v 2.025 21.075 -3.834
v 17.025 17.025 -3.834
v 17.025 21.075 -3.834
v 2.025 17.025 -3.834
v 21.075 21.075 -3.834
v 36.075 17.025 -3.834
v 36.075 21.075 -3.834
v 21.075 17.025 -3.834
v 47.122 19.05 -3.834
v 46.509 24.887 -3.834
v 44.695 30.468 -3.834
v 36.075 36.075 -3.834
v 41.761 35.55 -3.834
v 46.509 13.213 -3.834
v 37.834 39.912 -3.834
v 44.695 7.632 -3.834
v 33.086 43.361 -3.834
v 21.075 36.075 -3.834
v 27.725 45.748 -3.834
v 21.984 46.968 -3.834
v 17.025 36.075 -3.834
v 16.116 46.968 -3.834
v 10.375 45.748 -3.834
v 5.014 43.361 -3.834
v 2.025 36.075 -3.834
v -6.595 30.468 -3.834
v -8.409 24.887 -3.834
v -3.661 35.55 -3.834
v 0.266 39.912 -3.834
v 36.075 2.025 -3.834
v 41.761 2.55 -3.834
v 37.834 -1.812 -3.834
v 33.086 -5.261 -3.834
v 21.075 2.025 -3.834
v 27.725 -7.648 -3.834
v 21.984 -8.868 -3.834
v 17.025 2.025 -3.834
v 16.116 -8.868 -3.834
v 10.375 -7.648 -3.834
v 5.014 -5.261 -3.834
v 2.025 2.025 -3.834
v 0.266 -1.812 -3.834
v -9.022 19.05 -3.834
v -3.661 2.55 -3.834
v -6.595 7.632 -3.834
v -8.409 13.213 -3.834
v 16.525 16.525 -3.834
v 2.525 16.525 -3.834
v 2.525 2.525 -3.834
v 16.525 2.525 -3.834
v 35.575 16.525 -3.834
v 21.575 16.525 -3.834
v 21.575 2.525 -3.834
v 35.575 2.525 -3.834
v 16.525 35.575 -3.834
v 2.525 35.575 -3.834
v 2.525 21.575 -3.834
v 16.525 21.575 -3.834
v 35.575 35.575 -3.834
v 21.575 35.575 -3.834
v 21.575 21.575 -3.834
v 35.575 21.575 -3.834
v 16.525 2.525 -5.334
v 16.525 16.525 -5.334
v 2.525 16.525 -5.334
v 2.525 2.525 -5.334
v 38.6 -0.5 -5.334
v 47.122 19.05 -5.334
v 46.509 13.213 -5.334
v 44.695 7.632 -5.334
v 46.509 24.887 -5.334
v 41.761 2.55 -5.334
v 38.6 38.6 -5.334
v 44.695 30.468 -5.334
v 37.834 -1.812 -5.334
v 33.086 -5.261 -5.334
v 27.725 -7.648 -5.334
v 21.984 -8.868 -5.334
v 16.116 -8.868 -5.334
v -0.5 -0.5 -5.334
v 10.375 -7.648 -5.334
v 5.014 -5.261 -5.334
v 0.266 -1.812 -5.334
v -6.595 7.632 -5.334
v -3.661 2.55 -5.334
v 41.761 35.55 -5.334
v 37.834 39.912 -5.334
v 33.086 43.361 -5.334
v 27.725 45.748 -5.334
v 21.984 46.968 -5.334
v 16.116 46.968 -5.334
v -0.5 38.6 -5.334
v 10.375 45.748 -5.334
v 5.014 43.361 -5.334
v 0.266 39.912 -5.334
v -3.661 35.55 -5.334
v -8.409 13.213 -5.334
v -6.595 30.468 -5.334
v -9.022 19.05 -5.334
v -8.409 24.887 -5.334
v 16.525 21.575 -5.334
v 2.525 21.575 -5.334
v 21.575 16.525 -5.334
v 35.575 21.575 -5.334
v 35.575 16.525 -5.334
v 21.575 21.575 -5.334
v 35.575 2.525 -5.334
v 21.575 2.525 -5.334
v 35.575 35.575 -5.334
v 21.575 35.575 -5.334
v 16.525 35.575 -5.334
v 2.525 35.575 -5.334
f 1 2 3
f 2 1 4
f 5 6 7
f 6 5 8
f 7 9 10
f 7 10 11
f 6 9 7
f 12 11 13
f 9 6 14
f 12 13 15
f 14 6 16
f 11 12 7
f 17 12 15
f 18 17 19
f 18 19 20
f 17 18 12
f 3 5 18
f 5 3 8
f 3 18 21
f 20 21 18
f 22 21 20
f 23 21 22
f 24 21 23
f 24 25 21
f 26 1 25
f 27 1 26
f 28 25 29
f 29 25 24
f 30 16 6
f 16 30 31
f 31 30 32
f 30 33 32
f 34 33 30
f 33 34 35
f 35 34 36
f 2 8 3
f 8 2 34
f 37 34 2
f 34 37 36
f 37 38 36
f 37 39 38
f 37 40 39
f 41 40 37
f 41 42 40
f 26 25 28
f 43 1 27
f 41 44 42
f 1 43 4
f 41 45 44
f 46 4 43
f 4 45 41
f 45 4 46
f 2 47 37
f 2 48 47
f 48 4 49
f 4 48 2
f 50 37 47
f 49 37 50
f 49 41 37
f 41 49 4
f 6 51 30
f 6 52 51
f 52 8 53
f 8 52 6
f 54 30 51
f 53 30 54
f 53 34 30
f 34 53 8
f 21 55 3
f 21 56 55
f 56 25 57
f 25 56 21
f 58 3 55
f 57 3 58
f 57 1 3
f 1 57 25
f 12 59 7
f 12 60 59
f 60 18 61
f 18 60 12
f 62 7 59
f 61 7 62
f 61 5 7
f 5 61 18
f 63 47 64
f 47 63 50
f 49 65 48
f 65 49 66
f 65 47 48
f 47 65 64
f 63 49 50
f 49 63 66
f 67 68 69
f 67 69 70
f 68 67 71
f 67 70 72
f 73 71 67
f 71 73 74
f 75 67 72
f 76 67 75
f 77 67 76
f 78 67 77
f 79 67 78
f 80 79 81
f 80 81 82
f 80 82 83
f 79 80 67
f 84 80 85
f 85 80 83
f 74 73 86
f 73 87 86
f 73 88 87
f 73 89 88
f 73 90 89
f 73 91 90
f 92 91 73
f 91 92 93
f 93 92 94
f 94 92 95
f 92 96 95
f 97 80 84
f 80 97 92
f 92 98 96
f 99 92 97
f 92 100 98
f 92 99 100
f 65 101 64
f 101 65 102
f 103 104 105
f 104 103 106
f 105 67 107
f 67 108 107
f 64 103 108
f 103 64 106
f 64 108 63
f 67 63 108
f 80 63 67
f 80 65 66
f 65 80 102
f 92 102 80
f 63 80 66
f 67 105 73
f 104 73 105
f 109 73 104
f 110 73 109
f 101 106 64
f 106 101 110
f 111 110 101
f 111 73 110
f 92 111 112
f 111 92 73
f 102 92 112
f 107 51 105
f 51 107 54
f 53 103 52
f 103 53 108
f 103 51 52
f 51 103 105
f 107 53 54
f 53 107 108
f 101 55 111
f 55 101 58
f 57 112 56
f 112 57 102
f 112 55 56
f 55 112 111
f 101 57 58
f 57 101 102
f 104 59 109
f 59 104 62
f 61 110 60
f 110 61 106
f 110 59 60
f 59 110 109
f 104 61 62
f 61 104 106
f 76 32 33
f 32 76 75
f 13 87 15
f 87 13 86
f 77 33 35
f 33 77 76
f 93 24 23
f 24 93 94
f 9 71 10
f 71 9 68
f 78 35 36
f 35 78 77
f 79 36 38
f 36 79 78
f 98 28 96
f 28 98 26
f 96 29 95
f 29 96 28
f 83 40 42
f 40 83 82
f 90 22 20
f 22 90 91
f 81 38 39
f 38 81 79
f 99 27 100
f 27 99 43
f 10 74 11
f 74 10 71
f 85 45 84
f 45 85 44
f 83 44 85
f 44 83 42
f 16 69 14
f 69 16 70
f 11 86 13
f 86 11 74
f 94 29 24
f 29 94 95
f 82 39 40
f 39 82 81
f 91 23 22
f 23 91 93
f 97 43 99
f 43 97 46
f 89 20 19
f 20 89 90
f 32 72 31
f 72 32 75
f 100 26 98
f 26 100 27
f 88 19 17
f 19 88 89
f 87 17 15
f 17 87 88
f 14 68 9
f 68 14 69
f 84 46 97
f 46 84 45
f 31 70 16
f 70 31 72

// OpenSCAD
// file: ../../lib/circuits/helpers.scad
function bu(u) = u * 2.54;

module breadboard_row(number, orientation="vertical") {
  children();
  if(number > 1) {
    if(orientation == "vertical") {
      translate([0,bu(1),0])
        breadboard_row(number-1, orientation=orientation) {
          children();
        }
    } else {
      translate([bu(1),0,0])
        breadboard_row(number-1, orientation=orientation){
          children();
        }
    }
  }
}
// file: ../../lib/switches/rgb.scad
include <../variables.scad>

module rgb_row_trace_connection(width, height, xpos, ypos, rgb, connections) {
  half_width = u_mm(width)/2;
  half_height = u_mm(height)/2;
  if(connections[3] == "connect") {
    translate([1-half_width,8.875,0]){
      circle(d=0.8,$fn=40);
      offset(0.4)
        polygon(points=[[0,-0.01],[0,0.01],[u_mm(-xpos)-2, u_mm(-ypos)+0.01],[u_mm(-xpos)-2, u_mm(-ypos)-0.01]]);
    }
    translate([1-half_width,4.9,0]){
      circle(d=0.8,$fn=40);
      offset(0.4)
        polygon(points=[[0,-0.01],[0,0.01],[u_mm(-xpos)-2, u_mm(-ypos)+0.01],[u_mm(-xpos)-2, u_mm(-ypos)-0.01]]);
    }
    translate([1-half_width,3.3,0]){
      circle(d=0.8,$fn=40);
      offset(0.4)
        polygon(points=[[0,-0.01],[0,0.01],[u_mm(-xpos)-2, u_mm(-ypos)+0.01],[u_mm(-xpos)-2, u_mm(-ypos)-0.01]]);
    }
  }
  if(connections[2] == "connect") {
    translate([half_width-1,8.875,0]) {
      circle(d=0.8,$fn=40);
    }
    translate([half_width-1,4.9,0]) {
      circle(d=0.8,$fn=40);
    }
    translate([half_width-1,3.3,0]){
      circle(d=0.8,$fn=40);
    }
  }
}

module rgb_pcb_drill(width=1, height=1, rgb=true, connections=["hole","hole","hole","hole"]) {
  half_width = u_mm(width)/2;
  half_height = u_mm(height)/2;
  translate([half_width,half_height,0]) {
    if(rgb == true) {
      // LED Hole
      translate([-1.875,3.4])
        square([3.75,3]);

      // LED D
      if(connections[3] == "hole")
        translate([1.3-half_width,8,0])
          circle(d=1,$fn=40);
      if(connections[2] == "hole")
        translate([half_width-1.3,8,0])
          circle(d=1,$fn=40);

      // LED G
      if(connections[3] == "hole")
        translate([1.3-half_width,5.4,0])
          circle(d=1,$fn=40);
      if(connections[2] == "hole")
        translate([half_width-1.3,5.4,0])
          circle(d=1,$fn=40);

      // LED V
      if(connections[3] == "hole")
        translate([1.3-half_width,2.8,0])
          circle(d=1,$fn=40);
      if(connections[2] == "hole")
        translate([half_width-1.3,2.8,0])
          circle(d=1,$fn=40);
    }

    children();
  }
}

module rgb_pcb_hole_traces(width=1, height=1, rgb=true, xpos=0, ypos=0, connections=["hole","hole","hole","hole"]) {
  half_width = u_mm(width)/2;
  half_height = u_mm(height)/2;
  translate([half_width,half_height,0]) {
    if(rgb == true) {
      // LED D
      if(connections[3] == "hole")
        translate([1.3-half_width,8,0])
          circle(d=2.5,$fn=40);
      if(connections[2] == "hole")
        translate([half_width-1.3,8,0])
          circle(d=2.5,$fn=40);

      // LED G
      if(connections[3] == "hole")
        translate([1.3-half_width,5.4,0])
          circle(d=2.5,$fn=40);
      if(connections[2] == "hole")
        translate([half_width-1.3,5.4,0])
          circle(d=2.5,$fn=40);

      // LED V
      if(connections[3] == "hole")
        translate([1.3-half_width,2.8,0])
          circle(d=2.5,$fn=40);
      if(connections[2] == "hole")
        translate([half_width-1.3,2.8,0])
          circle(d=2.5,$fn=40);
    }

    children();
  }
}

module rgb_pcb_traces(width=1, height=1, rgb=true, xpos=0, ypos=0, connections=["hole","hole","hole","hole"]) {
  half_width = u_mm(width)/2;
  half_height = u_mm(height)/2;
  rgb_pcb_hole_traces(width=width, height=height, rgb=rgb, connections=connections) {
    if(rgb == true) {
      rgb_row_trace_connection(width=width, height=height, xpos=xpos, ypos=ypos, rgb=rgb, connections=connections);
      v_left = connections[3] == "none" ? 1 : half_width-5;
      // LED G
      translate([1.25,5])
        square([2,2]);
      translate([2.7,8.5,0]) {
        length = connections[2] == "none" ? 2 : half_width-3.7; 
        square([length,0.75]);
      }
      translate([2.7,6.8])
        square([0.8,2.4]);
      translate([-3.5,6.2])
        square([7,0.8]);
      translate([-3.5,6.8])
        square([0.8,2.4]);
      translate([-4-v_left,8.5,0])
        square([v_left+1,0.75]);

      // LED D
      translate([-4-v_left,4.5,0])
        square([v_left,0.8]);
      translate([-4.5,4.5,0])
        square([0.8,1.3]);
      translate([-4.5,5,0])
        square([1.3,0.8]);
      translate([2,4,0])
        square([2,0.8]);
      translate([4,4,0])
        square([0.8,1.3]);
      translate([4,4.5,0]) {
        length = connections[2] == "none" ? 0 : half_width-5; 
        square([length,0.75]);
      }
      translate([-3.375,5])
        square([2,1.1]);
      translate([1.25,3.75])
        square([2,1.1]);

      // LED V
      v_right = connections[2] == "none" ? 0 : half_width-5.25;
      translate([-4-v_left,2.9,0])
        square([v_right+v_left+8.875,0.8]);
      translate([-3.375,3.5])
        square([2,1.35]);
    }

    children();
  }
}
// file: ../../lib/switches/base.scad
include <../variables.scad>
include <rgb.scad>

// ["top", "bottom", "left", "right"]

module switch_row_trace_connection(width, height, xpos, ypos, rgb, connections) {
  half_width = u_mm(width)/2;
  half_height = u_mm(height)/2;
  if(connections[3] == "connect") {
    translate([1-half_width,-5.5,0]){
      circle(d=0.8,$fn=40);
      offset(0.4)
        polygon(points=[[0,-0.01],[0,0.01],[u_mm(-xpos)-2, u_mm(-ypos)+0.01],[u_mm(-xpos)-2, u_mm(-ypos)-0.01]]);
    }
  }
  if(connections[2] == "connect") {
    translate([half_width-1,-5.5,0]) {
      circle(d=0.8,$fn=40);
    }
  }
}

module switch_column_trace_connection(width, height, xpos, ypos, rgb, connections, last_xpos=0, last_ypos=0) {
  half_width = u_mm(width)/2;
  half_height = u_mm(height)/2;
  if(connections[1] == "connect") {
    translate([-u_mm((width-1)/2)-0.9,half_height-1,0]) {
      circle(d=0.8,$fn=40);
      offset(0.4)
        polygon(points=[[0,-0.01],[0,0.01],[u_mm((width-1)/2),0.01],[u_mm((width-1)/2),-0.01]]);
    }
  }
  if(connections[0] == "connect") {
    y_off = u_mm(ypos-last_ypos);
    x_off = u_mm(last_xpos-xpos);
    translate([-0.875,-1-y_off-half_height,0]) {
      offset(0.4)
        polygon(points=[[-0.01+x_off,0],[0.01+x_off,0],[0.01,2+y_off],[-0.01,2+y_off]]);
      translate([x_off-0.01,0]) {
        offset(0.4)
          polygon(points=[[0,-0.01],[0,0.01],[u_mm((width-1)/2)+1,0.01],[u_mm((width-1)/2)+1,-0.01]]);
      }
    }
  }
}

module switch_base_pcb_drill(width=1, height=1, rgb=true, single=true, connections=["hole","hole","hole","hole"]) {
  half_width = u_mm(width)/2;
  half_height = u_mm(height)/2;
  rgb_pcb_drill(width=width, height=height, rgb=rgb, connections=connections) {
    // Row
    if(connections[2] == "hole")
      translate([half_width-1.3,-5.5,0])
        circle(d=1,$fn=40);
    if(connections[3] == "hole")
      translate([1.3-half_width,-5.5,0])
        circle(d=1,$fn=40);

    // Column
    if(connections[1] == "hole")
      translate([-1,half_height-1.25,0])
        circle(d=1,$fn=40);
    if(connections[0] == "hole")
      translate([-1,1.25-half_height,0])
        circle(d=1,$fn=40);

    children();
  }
}

module switch_base_pcb_traces(width=1, height=1, rgb=true, xpos=0, ypos=0, connections=["hole","hole","hole","hole"], last_xpos=0, last_ypos=0, single=true) {
  half_width = u_mm(width)/2;
  half_height = u_mm(height)/2;
  rgb_pcb_traces(width=width, height=height, rgb=rgb, xpos=xpos, ypos=ypos, connections=connections) {
    switch_row_trace_connection(width, height, xpos, ypos, rgb, connections);
    if(single && !rgb)
      switch_column_trace_connection(width, height, xpos, ypos, rgb, connections, last_xpos=last_xpos, last_ypos=last_ypos);

    // Row
    if(connections[2] == "hole")
      translate([half_width-1.3,-5.5,0])
        circle(d=2.5,$fn=40);
    if(connections[3] == "hole")
      translate([1.3-half_width,-5.5,0])
        circle(d=2.5,$fn=40);

    // Column
    if(connections[1] == "hole")
      translate([-1,half_height-1.25,0])
        circle(d=2.4,$fn=40);
    if(connections[0] == "hole")
      translate([-1,1.25-half_height,0])
        circle(d=2.4,$fn=40);

    children();
  }
}

module switch_base_pcb_traces_bottom(width=1, height=1, rgb=true, xpos=0, ypos=0, connections=["hole","hole","hole","hole"], last_xpos=0, last_ypos=0) {
  half_width = u_mm(width)/2;
  half_height = u_mm(height)/2;
  rgb_pcb_hole_traces(width=width, height=height, rgb=rgb, connections=connections) {
    switch_column_trace_connection(width, height, xpos, ypos, rgb, connections, last_xpos=last_xpos, last_ypos=last_ypos);

    // Row
    if(connections[2] == "hole")
      translate([half_width-1.3,-5.5,0])
        circle(d=2.5,$fn=40);
    if(connections[3] == "hole")
      translate([1.3-half_width,-5.5,0])
        circle(d=2.5,$fn=40);

    // Column
    if(connections[1] == "hole")
      translate([-1,half_height-1.25,0])
        circle(d=2.5,$fn=40);
    if(connections[0] == "hole")
      translate([-1,1.25-half_height,0])
        circle(d=2.5,$fn=40);

    children();
  }
}
// file: ../../lib/switches/footprints.scad
include <../variables.scad>
include <stabilizers.scad>

module pcb_switch_outline(width=1, height=1) {
  stab_extra = width >= 2 ? 2 : 0;
  translate([0,-stab_extra])
    square([u_mm(width)+0.01, u_mm(height)+0.01+stab_extra]);
}

module pcb_switch_space_outline(width=1, height=1, style="mx", cnc=false) {
  offset = height_for_style(style);
  stab_extra = width >= 2 ? 2 : 0;
  translate([-1,-1-stab_extra,2.834-offset])
    cube([u_mm(width) + 2, u_mm(height) + 2 + stab_extra, 1.166+offset]);
  translate([u_mm(width/2),u_mm(height/2)]) {
    translate([-7.5,-7.5,1.5-offset])
      cube([15,15,5]);
    translate([-7,-7,-10])
      cube([14,14,10]);
    translate([u_mm(-width/2)-0.5,u_mm(-height/2)-0.5,-20-offset])
      cube([u_mm(width)+1,u_mm(height)+1, 20]);
  }
  translate([hole_offset(width), hole_offset(height),-10])
    stab(width);
}
// file: ../../lib/switches/stabilizers.scad
module stab_hole_render(distance){
  translate([14+distance+3.375,6.99,0]) {
    circle(d=3.175, $fn=40);
    translate([0,-15.24,0])
      circle(d=4.064, $fn=40);
  }
  translate([-6.75-distance+3.375,6.99,0]) {
    circle(d=3.175, $fn=40);
    translate([0,-15.24,0])
      circle(d=4.064, $fn=40);
  }
}

module stab_holes(width) {
  if (width >= 7) {
    stab_hole_render(39.6);
  } else if (width >= 6) {
    stab_hole_render(39.6);
  } else if(width >= 2) {
    stab_hole_render(1.6);
  }
}

module stab_render(distance, cnc=false, height=5.334) {
  translate([14+distance,1.47,0]){
    // Right Side Large Hole
    cube([6.75,12.3,10]);

    // Add 1/16" corner holes for milling
    if(cnc){
      translate([0.56,0.56,0])
        cylinder(h=10,d=1.59,$fn=20);
      translate([6.75-0.56,0.56,0])
        cylinder(h=10,d=1.59,$fn=20);
      translate([0.56,12.3-0.56,0])
        cylinder(h=10,d=1.59,$fn=20);
      translate([6.75-0.56,12.3-0.56,0])
        cylinder(h=10,d=1.59,$fn=20);
    }
    translate([5.75,3.23,0]){
      // Side hole for notch
      cube([1.825,3.175,10]);
      translate([1.825,1.59,0])
        if(cnc)
          resize([1.59,3.175,10])
            cylinder(h=10,d=1.59,$fn=20);
    }
    translate([1.725,11.3,0]){
      // Top Notch
      cube([3.3,2.2,10]);
      if(cnc)
        translate([1.65,2.2,0])
          resize([3.3,1,10])
            cylinder(h=10,d=1,$fn=20);
    }
    // Thin out for clip
    translate([-1,-1,10-height+1.5])
      cube([8.75,14.3,height-1.5]);
  }
  translate([-6.75-distance,1.47,0]){
    // Left Side Large Hole
    cube([6.75,12.3,10]);
    translate([-0.825,3.23,0]){
      // Side hole for notch
      cube([1.825,3.175,10]);
      if(cnc)
        translate([0,1.59,0])
          resize([1.59,3.175,10])
            cylinder(h=10,d=1.59,$fn=20);

    }
    translate([1.725,11.3,0]){
      // Top Notch
      cube([3.3,2.2,10]);
      if(cnc)
        translate([1.65,2.2,0])
          resize([3.3,1,10])
            cylinder(h=10,d=1,$fn=20);
    }
    if(cnc){
      translate([0.56,0.56,0])
        cylinder(h=10,d=1.59,$fn=20);
      translate([6.75-0.56,0.56,0])
        cylinder(h=10,d=1.59,$fn=20);
      translate([0.56,12.3-0.56,0])
        cylinder(h=10,d=1.59,$fn=20);
      translate([6.75-0.56,12.3-0.56,0])
        cylinder(h=10,d=1.59,$fn=20);
    }
    // Thin out for clip
    translate([-1,-1,10-height+1.5])
      cube([8.75,14.3,height-1.5]);
  }
  // Center shaft for bar
  translate([-distance-2,4.7,0]){
    cube([distance*2+20,4.6,10]);
  }
}

module stab(key_width, cnc=false) {
  if (key_width >= 7) {
    stab_render(39.6, cnc=cnc);
  } else if (key_width >= 6) {
    stab_render(39.6, cnc=cnc);
  } else if(key_width >= 2) {
    stab_render(1.6, cnc=cnc);
  }
}
// file: ../../lib/circuits/wire.scad
module guage(guage=12) {
  fn=20;
  if(guage == 8) {
    circle(d=3.25, $fn=fn);
  } else if (guage == 10) {
    circle(d=2.59, $fn=fn);
  } else if (guage == 12) {
    circle(d=2.06, $fn=fn);
  } else if (guage == 14) {
    circle(d=1.57, $fn=fn);
  } else if (guage == 16) {
    circle(d=1.3, $fn=fn);
  }
}

module wire_pcb_drill(guage=12) {
  offset(0.1)
    guage(guage);
}

module wire_pcb_traces(guage=12) {
  offset(0.75)
    guage(guage);
}

module wire_pcb_outline(guage=12) {
  offset(1.5)
    guage(guage);
}

module wire_space_outline(guage=12) {
  linear_extrude(10)
    offset(0.1)
      guage(guage);
}
// file: ../../lib/circuits/trrs.scad
module trrs_post(d=1.2) {
  translate([0,-d/4,0]) {
    circle(d=d, $fn=20);
    translate([-d/2,0,0]) {
      square([d,(d/2-.2)]);
    }
    translate([0,(d/2-.2),0]) {
      circle(d=d, $fn=20);
    }
  }
}

module trrs_pcb_drill(side="left") {
  translate([2.8,1.5]) {
    circle(d=2, $fn=20);
  }
  translate([2.8,8.5]) {
    circle(d=2, $fn=20);
  }
  translate([0.5,11.3,0]) {
    trrs_post();
  }
  translate([5.1,3.2,0]) {
    trrs_post();
  }
  translate([5.1,6.2,0]) {
    trrs_post();
  }
  translate([5.1,10.2,0]) {
    trrs_post();
  }
  if(side != "none"){
    offset = side == "left" ? 7.6 : -2;
    translate([offset,11.3]) {
      circle(d=1.2, $fn=20);
    }
    translate([offset,8.3]) {
      circle(d=1.2, $fn=20);
    }
    translate([offset,5.3]) {
      circle(d=1.2, $fn=20);
    }
    translate([offset,2.2]) {
      circle(d=1.2, $fn=20);
    }
  }
}

module trrs_pcb_traces(side="left") {
  translate([-1,9.7,0]){
    difference() {
      square([3,3]);
      if(side == "right") {
        translate([3,-1.8]) {
          rotate(45) {
            square(2);
          }
        }
      }
    }
  }
  translate([3.6,1.2,0]){
    difference() {
      square([3,3.5]);
      if(side == "left") {
        translate([3,2.3]) {
          rotate(45) {
            square(2);
          }
        }
      }
    }
  }
  translate([3.6,4.8,0]){
    difference() {
        square([3,3.5]);
        if(side == "left") {
          translate([3,2.3]) {
            rotate(45) {
              square(2);
            }
          }
        }
    }
  }
  translate([3.6,8.4,0]){
    difference() {
      square([3,3.2]);
      if(side == "left") {
        translate([3,1.8]) {
          rotate(45) {
            square(2);
          }
        }
      }
    }
  }
  if(side != "none"){
    translate([side == "left" ? 7.6 : -2,0,0]){
      translate([0,11.3]) {
        circle(d=3, $fn=20);
      }
      translate([0,8.3]) {
        circle(d=2.9, $fn=20);
      }
      translate([0,5.3]) {
        circle(d=3, $fn=20);
      }
      translate([0,2.2]) {
        circle(d=3, $fn=20);
      }
    }
    translate([side == "left" ? 5.6 : -2,0,0]){
      left_trace = side == "left" ? 2.5 : 7.6;
      translate([0,2.2]) {
        square([left_trace,1.5]);
      }
      translate([0,5.1]) {
        square([left_trace,1.5]);
      }
      if(side == "left") {
        translate([0,8.7]) {
          square([left_trace,0.9]);
        }
      }
      else {
        translate([0,8]) {
          square([4,1.6]);
        }
        translate([4,9]) {
          square([4,1.6]);
        }
        translate([2.8,9.4]) {
          rotate(-45) {
            square([1,1.7]);
          }
        }
      }
    }
    translate([side == "left" ? 0.5 : -2,0,0]){
      right_trace = side == "left" ? 7.1 : 2;
      translate([0,11.7]) {
        square([right_trace,1.3]);
      }
      translate([0,12]) {
        circle(1, $fn=20);
      }
      translate([right_trace,11.8]) {
        circle(1, $fn=20);
      }
    }
  }
}

module trrs_pcb_outline(side="left") {
  translate([-1,0,0]) {
    square([7.6,13.1]);
  }
  if(side != "none"){
    translate([side == "left" ? 5.6 : -3.5, 0]) {
      square([4,13.1]);
    }
  }
}

module trrs_space_outline(side="left") {
  translate([0,0,-5.3]) {
    linear_extrude(7){
      translate([-2,-1,0])
        square([9.6,15.1]);
      translate([0,-12.1,0])
        square([5.6,12.1]);
      if(side != "none")
        translate([side == "left" ? 5.6 : -4.5, -1])
          square([5,15.1]);
    }
  }
  translate([3,-2,-2.6]) {
    rotate([90,0,0]) {
      cylinder(d=10, h=30, $fn=100);
    }
  }
}
// file: ../../lib/circuits/trace.scad
function vdef(vector, index) = len(vector) == index ? vector[index-1] : vector[index];
function vadd(vector, index, axis) = vdef(vector, index)[axis] > vdef(vector, index-1)[axis] ? 0.01 : -0.01;
function polygon_from_vector(vector) = 
  len(vector) > 0 ?
    concat(vector, 
      [for (i = [1:len(vector)]) 
        [vector[len(vector)-i][0]-vadd(vector, i, 0),vector[len(vector)-i][1]-vadd(vector, i, 1)]])
      : [];

function parse_loc(loc) = [
  loc[5],
  len(loc) < 7 ? "both" : loc[6],
  len(loc) < 8 ? "none" : loc[7],
];

module manual_trace_pcb_drill(location) {
  vector = parse_loc(location)[0];
  echo("holes", parse_loc(location)[2]);
  if(parse_loc(location)[2] == "holes" || parse_loc(location)[2] == "hole_begin") {
    translate(vector[0]) {
      circle(d=1, $fn=20);
    }
  }
  if(parse_loc(location)[2] == "holes" || parse_loc(location)[2] == "hole_end") {
    translate(vector[len(vector)-1]) {
      circle(d=1, $fn=20);
    }
  }
}

module manual_trace_pcb_traces(location) {
  vector = parse_loc(location)[0];
  if(parse_loc(location)[1] != "bottom") {
    offset(0.4) {
      polygon(points=polygon_from_vector(vector));
    }
  }
  if(parse_loc(location)[2] == "holes" || parse_loc(location)[2] == "hole_begin") {
    translate(vector[0]) {
      circle(d=2.5, $fn=20);
    }
  }
  if(parse_loc(location)[2] == "holes" || parse_loc(location)[2] == "hole_end") {
    translate(vector[len(vector)-1]) {
      circle(d=2.5, $fn=20);
    }
  }
}

module manual_trace_pcb_traces_bottom(location) {
  vector = parse_loc(location)[0];
  if(parse_loc(location)[1] != "top") {
    offset(0.4) {
      polygon(points=polygon_from_vector(vector));
    }
  }
  if(parse_loc(location)[2] == "holes" || parse_loc(location)[2] == "hole_begin") {
    translate(vector[0]) {
      circle(d=2.5, $fn=20);
    }
  }
  if(parse_loc(location)[2] == "holes" || parse_loc(location)[2] == "hole_end") {
    translate(vector[len(vector)-1]) {
      circle(d=2.5, $fn=20);
    }
  }
}

module manual_trace_pcb_outline(location) {
  vector = parse_loc(location)[0];
  echo("location", location);
  offset(1)
    polygon(points=polygon_from_vector(vector));

  if(parse_loc(location)[2] == "holes" || parse_loc(location)[2] == "hole_begin") {
    translate(vector[0]) {
      circle(d=4, $fn=20);
    }
  }
  if(parse_loc(location)[2] == "holes" || parse_loc(location)[2] == "hole_end") {
    translate(vector[len(vector)-1]) {
      circle(d=4, $fn=20);
    }
  }
}

module manual_trace_space_outline(location) {
  vector = parse_loc(location)[0];
  translate([0,0,-1])
    linear_extrude(2)
      offset(0.5)
        manual_trace_pcb_outline(vector);
}
// file: ../../lib/circuits/support.scad
module support_pcb_drill(mm=2) {
  offset(0.1)
    circle(d=mm, $fn=20);
}

module support_pcb_traces(mm=2) {
}

module support_pcb_outline(mm=2) {
  offset(2)
    circle(d=mm, $fn=20);
}

module support_space_outline(mm=2) {
  linear_extrude(10)
    offset(0.1)
      circle(d=mm, $fn=20);
}
// file: ../../lib/circuits/proton_c.scad
use <helpers.scad>

module proton_c_pcb_drill(size="full") {
  translate([bu(0.5),bu(1.5),0]) {
    translate([0,bu(1)])
      breadboard_row(4, "horizontal"){
        circle(d=1, $fn=20);
        translate([0,bu(1)])
          circle(d=1, $fn=20);
      }
    translate([bu(4),bu(1)])
      breadboard_row(2)
        circle(d=1, $fn=20);
    translate([bu(4),bu(3)])
      breadboard_row(2)
        circle(d=1, $fn=20);
    circle(d=1, $fn=20);
    translate([bu(1),0,0])
      circle(d=1, $fn=20);
    translate([bu(5),0,0])
      circle(d=1, $fn=20);
    translate([bu(6),0,0])
      circle(d=1, $fn=20);
    breadboard_row(12) {
      circle(d=1, $fn=20);
      translate([bu(1),0,0])
        circle(d=1, $fn=20);
      translate([bu(5),0,0])
        circle(d=1, $fn=20);
      translate([bu(6),0,0])
        circle(d=1, $fn=20);
    }
    if(size == "full")
      translate([0,bu(13)])
        breadboard_row(6) {
          circle(d=1, $fn=20);
          translate([bu(1),0,0])
            circle(d=1, $fn=20);
          translate([bu(5),0,0])
            circle(d=1, $fn=20);
          translate([bu(6),0,0])
            circle(d=1, $fn=20);
    }
  }
}

module proton_c_pcb_traces(size="full") {
  translate([bu(0.5),bu(1.5),0]) {
    translate([0,bu(1)])
      breadboard_row(4, "horizontal"){
        circle(d=2.4, $fn=20);
        translate([-1,0])
          square([2,bu(1)]);
        translate([0,bu(1)])
          circle(d=2.4, $fn=20);
      }
    translate([0,bu(1)])
      breadboard_row(2) {
        translate([bu(5),0])
          circle(d=2.4, $fn=20);
        translate([bu(5),-1,0])
          square([bu(1),2]);
        translate([bu(6),0,0])
          circle(d=2.4, $fn=20);
      }
    translate([bu(4),bu(1)]){
      translate([-0.75,-1])
        square([1.5,bu(2)-2]);
      breadboard_row(2)
        circle(d=2.4, $fn=20);
      translate([0,-0.75])
        square([bu(2),1.5]);
    }
    translate([bu(4),bu(3)]){
      translate([-0.75,-1])
        square([1.5,bu(2)-2]);
      breadboard_row(2)
        circle(d=2.4, $fn=20);
      translate([0,-0.75])
        square([bu(2),1.5]);
    }
    circle(d=2.4, $fn=20);
    translate([0,-1,0])
      square([bu(1),2]);
    translate([bu(1),0,0])
      circle(d=2.4, $fn=20);
    translate([bu(5),0])
      circle(d=2.4, $fn=20);
    translate([bu(5),-1,0])
      square([bu(1),2]);
    translate([bu(6),0,0])
      circle(d=2.4, $fn=20);
    translate([0,bu(3)])
      breadboard_row(9) {
        circle(d=2.4, $fn=20);
        translate([0,-1,0])
          square([bu(1),2]);
        translate([bu(1),0,0])
          circle(d=2.4, $fn=20);
        translate([bu(5),0])
          circle(d=2.4, $fn=20);
        translate([bu(5),-1,0])
          square([bu(1),2]);
        translate([bu(6),0,0])
          circle(d=2.4, $fn=20);
      }
    if(size == "full")
      translate([0,bu(13)])
        breadboard_row(6) {
          circle(d=2.4, $fn=20);
          translate([0,-1,0])
            square([bu(1),2]);
          translate([bu(1),0,0])
            circle(d=2.4, $fn=20);
          translate([bu(5),0])
            circle(d=2.4, $fn=20);
          translate([bu(5),-1,0])
            square([bu(1),2]);
          translate([bu(6),0,0])
            circle(d=2.4, $fn=20);
        }
  }
}

module proton_c_pcb_outline(size="full") {
  translate([0,bu(1)])
  square([bu(7), bu(size == "full" ? 19 : 12)]);
}

module proton_c_space_outline(size="full") {
  translate([0,0,-4]) {
    linear_extrude(6) {
      translate([-bu(0.5),-bu(0.5)])
        square([bu(8), bu(size == "full" ? 21 : 14)]);
    }
    linear_extrude(5) {
      translate([bu(0.5),-bu(15),0])
        square([bu(6),bu(25)]);
    }
  }
}
// file: ../../lib/circuits/pro_micro.scad
use <helpers.scad>

module pro_micro_pcb_drill(connections="holes") {
  translate([bu(0.5),bu(1.5),0]) {
    if(connections == "holes"){
      translate([bu(3),bu(1)])
        breadboard_row(3)
          circle(d=1, $fn=20);
      translate([bu(4),bu(3)])
        breadboard_row(3)
          circle(d=1, $fn=20);
    }
    breadboard_row(12) {
      circle(d=1, $fn=20);
      if(connections == "holes") {
        translate([bu(1),0,0])
          circle(d=1, $fn=20);
        translate([bu(5),0,0])
          circle(d=1, $fn=20);
      }
      translate([bu(6),0,0])
        circle(d=1, $fn=20);
    }
  }
}

module pro_micro_pcb_traces(connections="holes") {
  translate([bu(0.5),bu(1.5),0]) {
    // GRND
    if(connections == "holes"){
      translate([bu(3),bu(1)]){
        translate([-0.75,-1])
          square([1.5,bu(3)-2]);
        breadboard_row(3)
          circle(d=2.4, $fn=20);
        translate([0,-0.75])
          square([bu(2),1.5]);
      }
      translate([bu(4),bu(3)]){
        translate([-0.75,-1])
          square([1.5,bu(3)-2]);
        breadboard_row(3)
          circle(d=2.4, $fn=20);
        translate([0,-0.75])
          square([bu(2),1.5]);
      }
    }
    breadboard_row(12) {
      circle(d=2.4, $fn=20);
      if(connections == "holes") {
        translate([0,-1,0])
          square([bu(1),2]);
        translate([bu(1),0,0])
          circle(d=2.4, $fn=20);
        translate([bu(5),0])  
          circle(d=2.4, $fn=20);
        translate([bu(5),-1,0])
          square([bu(1),2]);
      }
      translate([bu(6),0,0])
        circle(d=2.4, $fn=20);
    }
  }
}

module pro_micro_pcb_outline() {
  translate([0,bu(1)])
  square([bu(7), bu(12)]);
}

module pro_micro_space_outline() {
  translate([0,0,-4]) {
    linear_extrude(6) {
      translate([-bu(0.5),-bu(0.5)])
        square([bu(8), bu(14)]);
    }
    linear_extrude(5) {
      translate([bu(0.5),-bu(15),0])
        square([bu(6),bu(25)]);
    }
  }
}
// file: ../../lib/circuits/mts_101.scad
use <../variables.scad>
module mts_101_pcb_drill() {
  translate([0,1.25]) {
    translate([2.5,0])
      square([3,1]);
    translate([1.25,0.5])
      circle(d=1,$fn=40);
    translate([6.75,0.5])
      circle(d=1,$fn=40);

    translate([2.5,4.75])
      square([3,1]);
    translate([1.25,5.25])
      circle(d=1,$fn=40);
    translate([6.75,5.25])
      circle(d=1,$fn=40);

    translate([4,10])
      circle(d=1,$fn=40);
    translate([1.25,10])
      circle(d=1,$fn=40);
    translate([6.75,10])
      circle(d=1,$fn=40);
  }
}

module mts_101_pcb_traces() {
  translate([0,1.25]) {
    translate([2,-0.5])
      square([4,2]);
    translate([1.25,0.5])
      circle(d=2,$fn=40);
    translate([6.75,0.5])
      circle(d=2,$fn=40);

    translate([2,4.25])
      square([4,2]);
    translate([1.25,5.25])
      circle(d=2,$fn=40);
    translate([6.75,5.25])
      circle(d=2,$fn=40);

    translate([4,10])
      circle(d=2,$fn=40);
    translate([1.25,9.5])
      square([6,1]);
    translate([1.25,10])
      circle(d=2,$fn=40);
    translate([6.75,10])
      circle(d=2,$fn=40);
  }
}

module mts_101_pcb_outline() {
  square([8,13]);
}

module mts_101_space_outline(, cnc=false) {
  translate([-0.5,-0.5,-10])
    cube([9,14, 14.4]);
  translate([4,6.5,-26]) {
    cylinder(d=6, h=18, $fn=30);
    cylinder(d=12, h=10, $fn=60);
  }
}
// file: ../../lib/circuits/ec11.scad
use <../variables.scad>
use <../switches/base.scad>

module 1u_centered() {
  translate([u_mm(0.5),u_mm(0.5)])
    children();
}

module ec11_pcb_drill(single=false, connections=["hole","hole","hole","hole"]) {
  switch_base_pcb_drill(rgb=false, connections=connections) {
    // Key Column
    translate([-3,0,0])
      circle(d=1,$fn=40);

    // Key Row
    translate([7,2.5])
      circle(d=1, $fn=20);

    if(single) {
      translate([4.25,-3,0])
        circle(d=1, $fn=20);
      translate([-3,-3.25,0])
        circle(d=1,$fn=40);
    }
    translate([4.25,0,0])
      circle(d=1, $fn=20);

    translate([7,-2.5])
      circle(d=1, $fn=20);

    if(connections[3] == "hole"){
      translate([-5.5,2.5])
        circle(d=1, $fn=20);
      translate([-5.5,0])
        circle(d=1, $fn=20);
      translate([-5.5,-2.5])
        circle(d=1, $fn=20);
    }
    translate([-7.5,-2.5])
      circle(d=1, $fn=20);
    translate([-7.5,2.5])
      circle(d=1, $fn=20);
    translate([-7.5,0])
      circle(d=1, $fn=20);

    translate([-1.3,-6.25])
      square([2.6,1.5]);
    translate([-1.3,4.75])
      square([2.6,1.5]);
  }
}

module ec11_pcb_traces(single=false, connections=["hole","hole","hole","hole"]) {
  switch_base_pcb_traces(single=single, rgb=false, connections=connections) {
    // Key Row
    if(single){
      translate([2,2.2])
        square([4.5,0.8]);
      r_len = connections[0] != "none" ? u_mm(0.5)-1 : 6;
      l_len = connections[1] != "none" ? u_mm(0.5)-1 : 6;
      translate([2,-r_len])
        square([0.8,r_len+l_len]);
      if(connections[0] != "none")
        translate([-2,1-u_mm(0.5)])
          square([4,0.8]);
      if(connections[1] != "none")
        translate([-2.1,u_mm(0.5)-1.6])
          square([4.9,0.8]);
    }
    translate([7,2.5])
      circle(d=2.5,$fn=40);

    // Key Column
    if(connections[3] != "none")
      translate([1-u_mm(0.5),-6])
        square([u_mm(0.5)-4,1]);
    translate([-3.25,-6])
      square([0.8,5]);
    translate([-3,0])
      circle(d=2.5,$fn=40);

    if(single){
      translate([-3,-3.25])
        circle(d=2.5,$fn=40);
      translate([4.25,-3])
        circle(d=2.5,$fn=40);
    } else {
      translate([-3,-3.25])
        square([7.8,0.8]);
    }

    translate([7,-2.5])
      circle(d=2.5,$fn=40);
    translate([4.25,0]) {
      circle(d=2.5,$fn=40);
      rotate(-45)
        square([5,0.8]);
    }

    translate([4,-6])
      square([0.8,3]);
    if(connections[2] != "none")
      translate([4,-6])
        square([4.5,0.8]);

    if(connections[3] == "hole"){
      translate([-5.5,2.5])
        circle(d=2.25, $fn=20);
      translate([-5.5,0])
        circle(d=2.25, $fn=20);
      translate([-5.5,-2.5])
        circle(d=2.25, $fn=20);
    }
    translate([-7.5,-2.5])
      circle(d=2.25, $fn=20);
    translate([-7.5,2.5])
      circle(d=2.25, $fn=20);
    translate([-7.5,0])
      circle(d=2.25, $fn=20);
  }
}

module ec11_pcb_traces_bottom(connections=["hole","hole","hole","hole"]) {
  switch_base_pcb_traces_bottom(rgb=false, connections=connections) {
    // Key Row
    translate([2,2.2])
      square([4.5,0.8]);
    r_len = connections[0] != "none" ? u_mm(0.5)-1 : 6;
    l_len = connections[1] != "none" ? u_mm(0.5)-1 : 6;
    translate([2,-r_len])
      square([0.8,r_len+l_len]);
    
    if(connections[0] != "none")
      translate([-1.3,1-u_mm(0.5)])
        square([4,0.8]);
    if(connections[1] != "none")
      translate([-1,u_mm(0.5)-1.4])
        square([3.8,0.8]);
    translate([7,2.5])
      circle(d=2.5,$fn=40);

    // Key Column
    translate([-3,0])
      circle(d=2.5,$fn=40);

    translate([7,-2.5])
      circle(d=2.5,$fn=40);
    translate([4.25,0]) {
      circle(d=2.5,$fn=40);
    }

    if(connections[3] == "hole"){
      translate([-5.5,2.5])
        circle(d=2.25, $fn=20);
      translate([-5.5,0])
        circle(d=2.25, $fn=20);
      translate([-5.5,-2.5])
        circle(d=2.25, $fn=20);
    }
    translate([-7.5,-2.5])
      circle(d=2.25, $fn=20);
    translate([-7.5,2.5])
      circle(d=2.25, $fn=20);
    translate([-7.5,0])
      circle(d=2.25, $fn=20);
  }
}

module ec11_pcb_outline() {
  square([u_mm(1), u_mm(1)]);
}

module ec11_space_outline() {
  translate([-0.5,-0.5, -6])
    cube([u_mm(1)+1, u_mm(1)+1, 8]);
  1u_centered() {
    translate([0,0,-15])
      linear_extrude(15)
        circle(d=7, $fn=30);
    translate([0,0,-25])
      linear_extrude(15)
        circle(d=19, $fn=80);
  }
}
// file: ../../lib/switches/choc_v1.scad
include <../variables.scad>
include <stabilizers.scad>
include <footprints.scad>

module switch_choc_v1_pcb_drill(width=1, height=1) {
  half_width = u_mm(width)/2;
  half_height = u_mm(height)/2;
  translate([half_width,half_height,0]) {
    circle(d=3.5, $fn=30);

    translate([-5.5,0])
      circle(d=2, $fn=30);
    translate([3,3.8])
      circle(d=1, $fn=30);
    translate([-4, 3.8])
      circle(d=1, $fn=30);
    translate([-4,1.25-half_height])
      circle(d=1, $fn=30);
    translate([-4, half_height-3])
      circle(d=1, $fn=30);

    translate([5.5,0])
      circle(d=2, $fn=30);
    translate([0,5.9])
      circle(d=1.3, $fn=30);
    translate([5,3.8])
      circle(d=1.3, $fn=30);
    translate([1-half_width, half_height-1])
      circle(d=1, $fn=30);
    translate([half_width-1, half_height-1])
      circle(d=1, $fn=30);
  }
}

module switch_choc_v1_pcb_traces(width=1, height=1) {
  half_width = u_mm(width)/2;
  half_height = u_mm(height)/2;
  translate([half_width,half_height,0]) {
    translate([5,3.8])
      circle(d=2.8, $fn=30);
    translate([3,3.8])
      circle(d=2.5, $fn=30);
    translate([-4, 3.8])
      circle(d=2.5, $fn=30);
    translate([-4.5, 2-half_height])
      square([1, u_mm(height)-4]);
    translate([-4,1.25-half_height])
      circle(d=2.5, $fn=30);
    translate([-4, half_height-3])
      circle(d=2.5, $fn=30);

    translate([0,5.9])
      circle(d=2.8, $fn=30);
    translate([-0.5, 5.9])
      square([1, half_height-6.9]);
    translate([1-half_width, half_height-1.5])
      square([half_width*2-2, 1]);
    translate([1-half_width, half_height-1])
      circle(d=2.5, $fn=30);
    translate([half_width-1, half_height-1])
      circle(d=2.5, $fn=30);
  }
}

module switch_choc_v1_pcb_outline(width=1, height=1) {
  pcb_switch_outline(width=width, height=height);
}
// file: ../../lib/switches/mx.scad
include <../variables.scad>
include <stabilizers.scad>
include <footprints.scad>
include <base.scad>
include <rgb.scad>

module switch_mx_pcb_drill(width=1, height=1, rgb=true, single=true, connections=["hole","hole","hole","hole"]) {
  half_width = u_mm(width)/2;
  half_height = u_mm(height)/2;
  translate([hole_offset(width), half_height]) {
    stab_holes(width);
  }

  switch_base_pcb_drill(width=width, height=height, single=single, rgb=rgb, connections=connections) {
    circle(d=4,$fn=40);
    translate([-3.8,-2.5,0])
      circle(d=1.7,$fn=40);
    translate([2.5,-5,0])
      circle(d=1.7,$fn=40);
    translate([5,0,0])
      circle(d=1.75,$fn=40);
    translate([-5,0,0])
      circle(d=1.75,$fn=40);

    // Column
    translate([-1.2,-3,0])
      circle(d=1,$fn=40);
    translate([5,-2,0])
      circle(d=1,$fn=40);
    if(single){
      translate([6,-3.7,0])
        circle(d=1,$fn=40);
      if(rgb) {
        translate([5,1.7,0])
          circle(d=1,$fn=40);
      } else {
        translate([6,-8.3,0])
          circle(d=1,$fn=40);
      }
    }
  }
}

module switch_mx_pcb_traces(width=1, height=1, rgb=true, single=true, xpos=0, ypos=0, connections=["hole","hole","hole","hole"], last_xpos=0, last_ypos=0) {
  half_width = u_mm(width)/2;
  half_height = u_mm(height)/2;
  switch_base_pcb_traces(width=width, height=height, rgb=rgb, xpos=xpos, ypos=ypos, connections=connections, last_xpos=last_xpos, last_ypos=last_ypos, single=single) {
    translate([-3.8,-2.5,0])
      circle(d=4,$fn=40);
    translate([2.5,-5,0])
      circle(d=4,$fn=40);

    // Row
    v_left = connections[3] == "none" ? 1 : half_width;
    v_right = connections[2] == "none" ? 1 : half_width-5;
    translate([1-v_left,-5.9,0])
      square([v_left+v_right+3,0.8]);

    // Column
    translate([-1.2,-3,0])
      circle(d=2.5,$fn=40);
    translate([5,-2,0])
      circle(d=2.5,$fn=40);
    if(single){
      translate([6,-3.7,0])
        circle(d=2.5,$fn=40);
      difference() {
        translate([5,0,0])
          circle(d=3.55,$fn=40);
        translate([5,-2,0])
          square(4);
      }
      if(rgb) {
        translate([5,1.7,0])
          circle(d=2.3,$fn=40);
      } else {
        translate([4.2,1])
          square([0.8, half_height-2]);
        translate([-1,half_height-1.5])
          square([6,0.8]);
        translate([6,-8.3,0])
          circle(d=2.5,$fn=40);
        translate([-1.3,-8.7,0])
          square([7,0.8]);
      }
    }
  }
}

module switch_mx_pcb_traces_bottom(width=1, height=1, rgb=true, xpos=0, ypos=0, connections=["hole","hole","hole","hole"], last_xpos=0, last_ypos=0) {
  half_width = u_mm(width)/2;
  half_height = u_mm(height)/2;
  switch_base_pcb_traces_bottom(width=width, height=height, rgb=rgb, xpos=xpos, ypos=ypos, connections=connections, last_xpos=last_xpos, last_ypos=last_ypos) {
    translate([-3.8,-2.5,0])
      circle(d=4,$fn=40);
    translate([2.5,-5,0])
      circle(d=4,$fn=40);

    // Column
    translate([-1.2,-3,0])
      circle(d=2.5,$fn=40);
    translate([5,-2,0])
      circle(d=2.5,$fn=40);
    difference(){
      translate([2.5,-5,0])
        circle(d=5.9,$fn=40);
      translate([2.5,-5,0])
        circle(d=4.1,$fn=40);
      translate([0.3,-7,0])
        rotate(45)
          square(6);
    }
    translate([3.85,-3.45])
      square([0.8, 1]);

    t_height = connections[0] == "none" ? 1 : half_height-7.8;
    echo("h", 2-half_height, t_height);
    translate([-1.3,-t_height-6.8])
      square([0.8, t_height]);
    translate([-1.3,-7.2])
      square([2.2,0.8]);
    difference() {
      translate([5,0,0])
        circle(d=3.35,$fn=40);
      translate([5,-2,0])
        square(4);
    }
    b_height = connections[1] == "none" ? 2 : half_height-2;
    translate([4.2,1])
      square([0.8, b_height]);
    if(connections[1] != "none")
      translate([-1,half_height-1.5])
        square([6,0.8]);
  }
}

module switch_mx_pcb_outline(width=1, height=1) {
  pcb_switch_outline(width=width, height=height);
}
// file: ../../lib/utilities.scad
function reverse(list) = len(list) > 0 ? [for (i = [1:len(list)]) list[len(list)-i]] : [];
function pop(list) = len(list) > 0 ? [for (i = [0:len(list)-1]) if (i != 0) list[i]] : [];
// file: ../../lib/switches.scad
use <utilities.scad>
include <switches/mx.scad>
include <switches/choc_v1.scad>

module rotate_translate(rotation, xpos, ypos) {
  if(rotation[0] == undef || rotation[0] == 0) {
    translate([u_mm(xpos), u_mm(ypos), 0]) {
      children();
    }
  } else {
    xoff = rotation[1] == undef ? 0 : rotation[1];
    yoff = rotation[2] == undef ? 0 : rotation[2];
    angle = rotation[0] == undef ? 0 : rotation[0];
    translate([u_mm(xpos - xoff), u_mm(ypos - yoff), 0])
      rotate(angle)
        translate([u_mm(xoff), u_mm(yoff), 0])
          children();
  }
}

module switch(type, style="mx", rgb=true, xpos=0, ypos=0, width=1, cnc=false, rotation=[0,0,0], connections=["hole","hole","hole","hole"], last_xpos=0, last_ypos=0) {
  rotate_translate(rotation, xpos, ypos) {
    if(type == "outline")
      pcb_switch_outline(width=width);
    if(style == "mx") {
      if(type == "key")
        pcb_switch_space_outline(width=width, cnc=cnc, style="mx");
      if(type == "traces")
        switch_mx_pcb_traces(width=width, rgb=rgb, xpos=xpos, ypos=ypos, connections=connections, last_xpos=last_xpos, last_ypos=last_ypos);
      if(type == "traces_top")
        switch_mx_pcb_traces(width=width, single=false, rgb=rgb, xpos=xpos, ypos=ypos, connections=connections, last_xpos=last_xpos, last_ypos=last_ypos);
      if(type == "traces_bottom")
        switch_mx_pcb_traces_bottom(width=width, rgb=rgb, xpos=xpos, ypos=ypos, connections=connections, last_xpos=last_xpos, last_ypos=last_ypos);
      if(type == "drill")
        switch_mx_pcb_drill(width=width, rgb=rgb, connections=connections);
      if(type == "drill_double")
        switch_mx_pcb_drill(width=width, single=false, rgb=rgb, connections=connections);
    }

    if(style == "choc_v1") {
      if(type == "key")
        pcb_switch_space_outline(width=width, cnc=cnc, style="choc_v1");
      if(type == "traces")
        switch_choc_v1_pcb_traces(width=width);
      if(type == "traces_top")
        switch_choc_v1_pcb_traces(width=width);
      if(type == "traces_bottom")
        assert(false, "traces_bottom is incompatible with choc_v1");
      if(type == "drill")
        switch_choc_v1_pcb_drill(width=width);
      if(type == "drill_double")
        switch_choc_v1_pcb_drill(width=width, single=false);
    }

    if(style == "redragon") {
      if(type == "key")
        pcb_switch_space_outline(width=width, cnc=cnc, style="redragon");
      if(type == "traces")
        switch_mx_pcb_traces(width=width, rgb=rgb);
      if(type == "traces_top")
        switch_mx_pcb_traces(width=width, single=false, rgb=rgb);
      if(type == "traces_bottom")
        switch_mx_pcb_traces_bottom(width=width, rgb=rgb);
      if(type == "traces")
        switch_mx_pcb_traces(width=width, rgb=rgb);
      if(type == "drill")
        switch_mx_pcb_drill(width=width);
      if(type == "drill_double")
        switch_mx_pcb_drill(width=width, single=false);
    }
  }
}

module switch_row(keys, style="mx", rgb=true, margin=5, thickness=10, depth=0, cnc=false, type="key", last_row=[], last_xpos=0, previous_xpos=0, last_ypos=0, previous_ypos=0) {
  width = keys[0][0] == undef ? 1 : keys[0][0];
  xpos = keys[0][1] == undef ? 0 : keys[0][1];
  ypos = keys[0][2] == undef ? 0 : keys[0][2];
  rotation = keys[0][3] == undef ? [0,0,0] : keys[0][3];
  connections = keys[0][4] == undef ? ["hole","hole","hole","hole"] : keys[0][4];
  last_ypos = last_row[0][2] == undef ? last_ypos - previous_ypos : last_row[0][2]+last_ypos - previous_ypos;
  last_xpos = last_row[0][1] == undef ? last_xpos - previous_xpos : last_row[0][1]+last_xpos - previous_xpos;
  switch(type, style=style, rgb=rgb, xpos=xpos, ypos=ypos, width=width, cnc=cnc, rotation=rotation, connections=connections, last_xpos=last_xpos, last_ypos=last_ypos);
  if(len(keys) > 1) {
    translate([xpos*key_size+width*key_size, ypos*key_size, 0])
      switch_row(pop(keys), style=style, rgb=rgb, margin=margin, thickness=thickness, depth=depth, cnc=cnc, type=type, last_row = pop(last_row), last_xpos=last_xpos, previous_xpos=xpos, last_ypos=last_ypos, previous_ypos=ypos);
  }
}

module switches(switches, style="mx", rgb=true, margin=5, thickness=10, depth=0, cnc=false, type="key", last_row=[]) {
  if(len(switches) != 0) {
    switch_row(switches[0], style=style, rgb=rgb, margin=margin, thickness=thickness, depth=depth, cnc=cnc, type=type, last_row=last_row);
    if(len(switches) > 1) {
      last_row = switches[0];
      translate([0, key_size, 0])
        switches(pop(switches), style=style, rgb=rgb, margin=margin, depth=depth, thickness=thickness, cnc=cnc, type=type, last_row=last_row);
    }
  }
}
// file: ../../lib/case.scad
include <variables.scad>
use <utilities.scad>
use <circuits.scad>

function key_width(key) = (key[0] == undef ? 1 : key[0]) + (key[1] == undef ? 0 : key[1]);
function width_row(row) = len(row) == 0 ? 0 : key_width(row[0]) + width_row(pop(row));
function width_board(rows) = len(rows) == 0 ? 0 : (
  let (current = width_row(rows[0]))
  let (next = width_board(pop(rows)))
    current > next ? current : next);

function key_height(key) = (key[2] == undef ? 0 : key[2]);
function height_row(row) = len(row) == 0 ? [0,0] : (
  let(other_rows = height_row(pop(row)))
  let(current = key_height(row[0]) + other_rows[0])
  let(maximum = current > other_rows[1] ? current : other_rows[1])
  [current, maximum]);
function height_board_rec(rows) = len(rows) == 0 ? 0 : (
  let (current = height_row(reverse(rows[0]))[1])
  let (next = height_board_rec(pop(rows)))
    current > next ? current : next);
function height_board(rows) = 
  let (height_rec = height_board_rec(rows))
    len(rows) + (height_rec > 0 ? height_rec : 0);

module case(rows, style="mx", margin=5, thickness=5, depth=0, radius=2, rest=0, circuits=[], _inherit_children="unset") {
  total_thickness = thickness + depth + height_for_style(style);
  z_offset = depth + height_for_style(style);
  if($children != 0 && (_inherit_children == "unset" || _inherit_children > 0)) {
    translate([0, 0, -z_offset])
      linear_extrude(total_thickness)
        offset(margin)
          children();
  } else {
    width=u_mm(width_board(rows))+margin*2;
    height=u_mm(height_board(rows))+margin*2+rest;
    translate([-margin, -margin, -z_offset]){
      translate([radius, 0, 0])
        cube([width-radius*2, height,total_thickness]);
      translate([0, radius, 0])
        cube([width, height-radius*2,total_thickness]);
      translate([radius, radius, 0])
        cylinder(total_thickness,radius,radius, $fn=60);
      translate([width-radius, radius, 0])
        cylinder(total_thickness,radius,radius, $fn=60);
      translate([width-radius, height-radius, 0])
        cylinder(total_thickness,radius,radius, $fn=60);
      translate([radius, height-radius, 0])
        cylinder(total_thickness,radius,radius, $fn=60);
    }
    if(len(circuits) > 0)
      translate([0, 0, -z_offset])
        linear_extrude(total_thickness)
          offset(margin)
            circuits_pcb_outline(circuits);
  }
}
// file: ../../lib/variables.scad
key_size=19.05;
hole=14;

function u_mm(u) = u*key_size;
function hole_offset(u) = (key_size-hole)/2+u_mm(u-1)/2;

// This is used to determine how much space is between the top
// of the plate and the PCB.
function height_for_style(style) = style == "mx"        ? 5.334 :
                                   style == "redragon" ? 3.75  :
                                   style == "choc_v1"   ? 2.2   :  "invalid style";
// main file
use <../../keyboard.scad>

layout = [
  [[],[]],
  [[],[]]
];
top_plate(layout)
  translate([u_mm(1),u_mm(1),0])
    circle(d=u_mm(3));
